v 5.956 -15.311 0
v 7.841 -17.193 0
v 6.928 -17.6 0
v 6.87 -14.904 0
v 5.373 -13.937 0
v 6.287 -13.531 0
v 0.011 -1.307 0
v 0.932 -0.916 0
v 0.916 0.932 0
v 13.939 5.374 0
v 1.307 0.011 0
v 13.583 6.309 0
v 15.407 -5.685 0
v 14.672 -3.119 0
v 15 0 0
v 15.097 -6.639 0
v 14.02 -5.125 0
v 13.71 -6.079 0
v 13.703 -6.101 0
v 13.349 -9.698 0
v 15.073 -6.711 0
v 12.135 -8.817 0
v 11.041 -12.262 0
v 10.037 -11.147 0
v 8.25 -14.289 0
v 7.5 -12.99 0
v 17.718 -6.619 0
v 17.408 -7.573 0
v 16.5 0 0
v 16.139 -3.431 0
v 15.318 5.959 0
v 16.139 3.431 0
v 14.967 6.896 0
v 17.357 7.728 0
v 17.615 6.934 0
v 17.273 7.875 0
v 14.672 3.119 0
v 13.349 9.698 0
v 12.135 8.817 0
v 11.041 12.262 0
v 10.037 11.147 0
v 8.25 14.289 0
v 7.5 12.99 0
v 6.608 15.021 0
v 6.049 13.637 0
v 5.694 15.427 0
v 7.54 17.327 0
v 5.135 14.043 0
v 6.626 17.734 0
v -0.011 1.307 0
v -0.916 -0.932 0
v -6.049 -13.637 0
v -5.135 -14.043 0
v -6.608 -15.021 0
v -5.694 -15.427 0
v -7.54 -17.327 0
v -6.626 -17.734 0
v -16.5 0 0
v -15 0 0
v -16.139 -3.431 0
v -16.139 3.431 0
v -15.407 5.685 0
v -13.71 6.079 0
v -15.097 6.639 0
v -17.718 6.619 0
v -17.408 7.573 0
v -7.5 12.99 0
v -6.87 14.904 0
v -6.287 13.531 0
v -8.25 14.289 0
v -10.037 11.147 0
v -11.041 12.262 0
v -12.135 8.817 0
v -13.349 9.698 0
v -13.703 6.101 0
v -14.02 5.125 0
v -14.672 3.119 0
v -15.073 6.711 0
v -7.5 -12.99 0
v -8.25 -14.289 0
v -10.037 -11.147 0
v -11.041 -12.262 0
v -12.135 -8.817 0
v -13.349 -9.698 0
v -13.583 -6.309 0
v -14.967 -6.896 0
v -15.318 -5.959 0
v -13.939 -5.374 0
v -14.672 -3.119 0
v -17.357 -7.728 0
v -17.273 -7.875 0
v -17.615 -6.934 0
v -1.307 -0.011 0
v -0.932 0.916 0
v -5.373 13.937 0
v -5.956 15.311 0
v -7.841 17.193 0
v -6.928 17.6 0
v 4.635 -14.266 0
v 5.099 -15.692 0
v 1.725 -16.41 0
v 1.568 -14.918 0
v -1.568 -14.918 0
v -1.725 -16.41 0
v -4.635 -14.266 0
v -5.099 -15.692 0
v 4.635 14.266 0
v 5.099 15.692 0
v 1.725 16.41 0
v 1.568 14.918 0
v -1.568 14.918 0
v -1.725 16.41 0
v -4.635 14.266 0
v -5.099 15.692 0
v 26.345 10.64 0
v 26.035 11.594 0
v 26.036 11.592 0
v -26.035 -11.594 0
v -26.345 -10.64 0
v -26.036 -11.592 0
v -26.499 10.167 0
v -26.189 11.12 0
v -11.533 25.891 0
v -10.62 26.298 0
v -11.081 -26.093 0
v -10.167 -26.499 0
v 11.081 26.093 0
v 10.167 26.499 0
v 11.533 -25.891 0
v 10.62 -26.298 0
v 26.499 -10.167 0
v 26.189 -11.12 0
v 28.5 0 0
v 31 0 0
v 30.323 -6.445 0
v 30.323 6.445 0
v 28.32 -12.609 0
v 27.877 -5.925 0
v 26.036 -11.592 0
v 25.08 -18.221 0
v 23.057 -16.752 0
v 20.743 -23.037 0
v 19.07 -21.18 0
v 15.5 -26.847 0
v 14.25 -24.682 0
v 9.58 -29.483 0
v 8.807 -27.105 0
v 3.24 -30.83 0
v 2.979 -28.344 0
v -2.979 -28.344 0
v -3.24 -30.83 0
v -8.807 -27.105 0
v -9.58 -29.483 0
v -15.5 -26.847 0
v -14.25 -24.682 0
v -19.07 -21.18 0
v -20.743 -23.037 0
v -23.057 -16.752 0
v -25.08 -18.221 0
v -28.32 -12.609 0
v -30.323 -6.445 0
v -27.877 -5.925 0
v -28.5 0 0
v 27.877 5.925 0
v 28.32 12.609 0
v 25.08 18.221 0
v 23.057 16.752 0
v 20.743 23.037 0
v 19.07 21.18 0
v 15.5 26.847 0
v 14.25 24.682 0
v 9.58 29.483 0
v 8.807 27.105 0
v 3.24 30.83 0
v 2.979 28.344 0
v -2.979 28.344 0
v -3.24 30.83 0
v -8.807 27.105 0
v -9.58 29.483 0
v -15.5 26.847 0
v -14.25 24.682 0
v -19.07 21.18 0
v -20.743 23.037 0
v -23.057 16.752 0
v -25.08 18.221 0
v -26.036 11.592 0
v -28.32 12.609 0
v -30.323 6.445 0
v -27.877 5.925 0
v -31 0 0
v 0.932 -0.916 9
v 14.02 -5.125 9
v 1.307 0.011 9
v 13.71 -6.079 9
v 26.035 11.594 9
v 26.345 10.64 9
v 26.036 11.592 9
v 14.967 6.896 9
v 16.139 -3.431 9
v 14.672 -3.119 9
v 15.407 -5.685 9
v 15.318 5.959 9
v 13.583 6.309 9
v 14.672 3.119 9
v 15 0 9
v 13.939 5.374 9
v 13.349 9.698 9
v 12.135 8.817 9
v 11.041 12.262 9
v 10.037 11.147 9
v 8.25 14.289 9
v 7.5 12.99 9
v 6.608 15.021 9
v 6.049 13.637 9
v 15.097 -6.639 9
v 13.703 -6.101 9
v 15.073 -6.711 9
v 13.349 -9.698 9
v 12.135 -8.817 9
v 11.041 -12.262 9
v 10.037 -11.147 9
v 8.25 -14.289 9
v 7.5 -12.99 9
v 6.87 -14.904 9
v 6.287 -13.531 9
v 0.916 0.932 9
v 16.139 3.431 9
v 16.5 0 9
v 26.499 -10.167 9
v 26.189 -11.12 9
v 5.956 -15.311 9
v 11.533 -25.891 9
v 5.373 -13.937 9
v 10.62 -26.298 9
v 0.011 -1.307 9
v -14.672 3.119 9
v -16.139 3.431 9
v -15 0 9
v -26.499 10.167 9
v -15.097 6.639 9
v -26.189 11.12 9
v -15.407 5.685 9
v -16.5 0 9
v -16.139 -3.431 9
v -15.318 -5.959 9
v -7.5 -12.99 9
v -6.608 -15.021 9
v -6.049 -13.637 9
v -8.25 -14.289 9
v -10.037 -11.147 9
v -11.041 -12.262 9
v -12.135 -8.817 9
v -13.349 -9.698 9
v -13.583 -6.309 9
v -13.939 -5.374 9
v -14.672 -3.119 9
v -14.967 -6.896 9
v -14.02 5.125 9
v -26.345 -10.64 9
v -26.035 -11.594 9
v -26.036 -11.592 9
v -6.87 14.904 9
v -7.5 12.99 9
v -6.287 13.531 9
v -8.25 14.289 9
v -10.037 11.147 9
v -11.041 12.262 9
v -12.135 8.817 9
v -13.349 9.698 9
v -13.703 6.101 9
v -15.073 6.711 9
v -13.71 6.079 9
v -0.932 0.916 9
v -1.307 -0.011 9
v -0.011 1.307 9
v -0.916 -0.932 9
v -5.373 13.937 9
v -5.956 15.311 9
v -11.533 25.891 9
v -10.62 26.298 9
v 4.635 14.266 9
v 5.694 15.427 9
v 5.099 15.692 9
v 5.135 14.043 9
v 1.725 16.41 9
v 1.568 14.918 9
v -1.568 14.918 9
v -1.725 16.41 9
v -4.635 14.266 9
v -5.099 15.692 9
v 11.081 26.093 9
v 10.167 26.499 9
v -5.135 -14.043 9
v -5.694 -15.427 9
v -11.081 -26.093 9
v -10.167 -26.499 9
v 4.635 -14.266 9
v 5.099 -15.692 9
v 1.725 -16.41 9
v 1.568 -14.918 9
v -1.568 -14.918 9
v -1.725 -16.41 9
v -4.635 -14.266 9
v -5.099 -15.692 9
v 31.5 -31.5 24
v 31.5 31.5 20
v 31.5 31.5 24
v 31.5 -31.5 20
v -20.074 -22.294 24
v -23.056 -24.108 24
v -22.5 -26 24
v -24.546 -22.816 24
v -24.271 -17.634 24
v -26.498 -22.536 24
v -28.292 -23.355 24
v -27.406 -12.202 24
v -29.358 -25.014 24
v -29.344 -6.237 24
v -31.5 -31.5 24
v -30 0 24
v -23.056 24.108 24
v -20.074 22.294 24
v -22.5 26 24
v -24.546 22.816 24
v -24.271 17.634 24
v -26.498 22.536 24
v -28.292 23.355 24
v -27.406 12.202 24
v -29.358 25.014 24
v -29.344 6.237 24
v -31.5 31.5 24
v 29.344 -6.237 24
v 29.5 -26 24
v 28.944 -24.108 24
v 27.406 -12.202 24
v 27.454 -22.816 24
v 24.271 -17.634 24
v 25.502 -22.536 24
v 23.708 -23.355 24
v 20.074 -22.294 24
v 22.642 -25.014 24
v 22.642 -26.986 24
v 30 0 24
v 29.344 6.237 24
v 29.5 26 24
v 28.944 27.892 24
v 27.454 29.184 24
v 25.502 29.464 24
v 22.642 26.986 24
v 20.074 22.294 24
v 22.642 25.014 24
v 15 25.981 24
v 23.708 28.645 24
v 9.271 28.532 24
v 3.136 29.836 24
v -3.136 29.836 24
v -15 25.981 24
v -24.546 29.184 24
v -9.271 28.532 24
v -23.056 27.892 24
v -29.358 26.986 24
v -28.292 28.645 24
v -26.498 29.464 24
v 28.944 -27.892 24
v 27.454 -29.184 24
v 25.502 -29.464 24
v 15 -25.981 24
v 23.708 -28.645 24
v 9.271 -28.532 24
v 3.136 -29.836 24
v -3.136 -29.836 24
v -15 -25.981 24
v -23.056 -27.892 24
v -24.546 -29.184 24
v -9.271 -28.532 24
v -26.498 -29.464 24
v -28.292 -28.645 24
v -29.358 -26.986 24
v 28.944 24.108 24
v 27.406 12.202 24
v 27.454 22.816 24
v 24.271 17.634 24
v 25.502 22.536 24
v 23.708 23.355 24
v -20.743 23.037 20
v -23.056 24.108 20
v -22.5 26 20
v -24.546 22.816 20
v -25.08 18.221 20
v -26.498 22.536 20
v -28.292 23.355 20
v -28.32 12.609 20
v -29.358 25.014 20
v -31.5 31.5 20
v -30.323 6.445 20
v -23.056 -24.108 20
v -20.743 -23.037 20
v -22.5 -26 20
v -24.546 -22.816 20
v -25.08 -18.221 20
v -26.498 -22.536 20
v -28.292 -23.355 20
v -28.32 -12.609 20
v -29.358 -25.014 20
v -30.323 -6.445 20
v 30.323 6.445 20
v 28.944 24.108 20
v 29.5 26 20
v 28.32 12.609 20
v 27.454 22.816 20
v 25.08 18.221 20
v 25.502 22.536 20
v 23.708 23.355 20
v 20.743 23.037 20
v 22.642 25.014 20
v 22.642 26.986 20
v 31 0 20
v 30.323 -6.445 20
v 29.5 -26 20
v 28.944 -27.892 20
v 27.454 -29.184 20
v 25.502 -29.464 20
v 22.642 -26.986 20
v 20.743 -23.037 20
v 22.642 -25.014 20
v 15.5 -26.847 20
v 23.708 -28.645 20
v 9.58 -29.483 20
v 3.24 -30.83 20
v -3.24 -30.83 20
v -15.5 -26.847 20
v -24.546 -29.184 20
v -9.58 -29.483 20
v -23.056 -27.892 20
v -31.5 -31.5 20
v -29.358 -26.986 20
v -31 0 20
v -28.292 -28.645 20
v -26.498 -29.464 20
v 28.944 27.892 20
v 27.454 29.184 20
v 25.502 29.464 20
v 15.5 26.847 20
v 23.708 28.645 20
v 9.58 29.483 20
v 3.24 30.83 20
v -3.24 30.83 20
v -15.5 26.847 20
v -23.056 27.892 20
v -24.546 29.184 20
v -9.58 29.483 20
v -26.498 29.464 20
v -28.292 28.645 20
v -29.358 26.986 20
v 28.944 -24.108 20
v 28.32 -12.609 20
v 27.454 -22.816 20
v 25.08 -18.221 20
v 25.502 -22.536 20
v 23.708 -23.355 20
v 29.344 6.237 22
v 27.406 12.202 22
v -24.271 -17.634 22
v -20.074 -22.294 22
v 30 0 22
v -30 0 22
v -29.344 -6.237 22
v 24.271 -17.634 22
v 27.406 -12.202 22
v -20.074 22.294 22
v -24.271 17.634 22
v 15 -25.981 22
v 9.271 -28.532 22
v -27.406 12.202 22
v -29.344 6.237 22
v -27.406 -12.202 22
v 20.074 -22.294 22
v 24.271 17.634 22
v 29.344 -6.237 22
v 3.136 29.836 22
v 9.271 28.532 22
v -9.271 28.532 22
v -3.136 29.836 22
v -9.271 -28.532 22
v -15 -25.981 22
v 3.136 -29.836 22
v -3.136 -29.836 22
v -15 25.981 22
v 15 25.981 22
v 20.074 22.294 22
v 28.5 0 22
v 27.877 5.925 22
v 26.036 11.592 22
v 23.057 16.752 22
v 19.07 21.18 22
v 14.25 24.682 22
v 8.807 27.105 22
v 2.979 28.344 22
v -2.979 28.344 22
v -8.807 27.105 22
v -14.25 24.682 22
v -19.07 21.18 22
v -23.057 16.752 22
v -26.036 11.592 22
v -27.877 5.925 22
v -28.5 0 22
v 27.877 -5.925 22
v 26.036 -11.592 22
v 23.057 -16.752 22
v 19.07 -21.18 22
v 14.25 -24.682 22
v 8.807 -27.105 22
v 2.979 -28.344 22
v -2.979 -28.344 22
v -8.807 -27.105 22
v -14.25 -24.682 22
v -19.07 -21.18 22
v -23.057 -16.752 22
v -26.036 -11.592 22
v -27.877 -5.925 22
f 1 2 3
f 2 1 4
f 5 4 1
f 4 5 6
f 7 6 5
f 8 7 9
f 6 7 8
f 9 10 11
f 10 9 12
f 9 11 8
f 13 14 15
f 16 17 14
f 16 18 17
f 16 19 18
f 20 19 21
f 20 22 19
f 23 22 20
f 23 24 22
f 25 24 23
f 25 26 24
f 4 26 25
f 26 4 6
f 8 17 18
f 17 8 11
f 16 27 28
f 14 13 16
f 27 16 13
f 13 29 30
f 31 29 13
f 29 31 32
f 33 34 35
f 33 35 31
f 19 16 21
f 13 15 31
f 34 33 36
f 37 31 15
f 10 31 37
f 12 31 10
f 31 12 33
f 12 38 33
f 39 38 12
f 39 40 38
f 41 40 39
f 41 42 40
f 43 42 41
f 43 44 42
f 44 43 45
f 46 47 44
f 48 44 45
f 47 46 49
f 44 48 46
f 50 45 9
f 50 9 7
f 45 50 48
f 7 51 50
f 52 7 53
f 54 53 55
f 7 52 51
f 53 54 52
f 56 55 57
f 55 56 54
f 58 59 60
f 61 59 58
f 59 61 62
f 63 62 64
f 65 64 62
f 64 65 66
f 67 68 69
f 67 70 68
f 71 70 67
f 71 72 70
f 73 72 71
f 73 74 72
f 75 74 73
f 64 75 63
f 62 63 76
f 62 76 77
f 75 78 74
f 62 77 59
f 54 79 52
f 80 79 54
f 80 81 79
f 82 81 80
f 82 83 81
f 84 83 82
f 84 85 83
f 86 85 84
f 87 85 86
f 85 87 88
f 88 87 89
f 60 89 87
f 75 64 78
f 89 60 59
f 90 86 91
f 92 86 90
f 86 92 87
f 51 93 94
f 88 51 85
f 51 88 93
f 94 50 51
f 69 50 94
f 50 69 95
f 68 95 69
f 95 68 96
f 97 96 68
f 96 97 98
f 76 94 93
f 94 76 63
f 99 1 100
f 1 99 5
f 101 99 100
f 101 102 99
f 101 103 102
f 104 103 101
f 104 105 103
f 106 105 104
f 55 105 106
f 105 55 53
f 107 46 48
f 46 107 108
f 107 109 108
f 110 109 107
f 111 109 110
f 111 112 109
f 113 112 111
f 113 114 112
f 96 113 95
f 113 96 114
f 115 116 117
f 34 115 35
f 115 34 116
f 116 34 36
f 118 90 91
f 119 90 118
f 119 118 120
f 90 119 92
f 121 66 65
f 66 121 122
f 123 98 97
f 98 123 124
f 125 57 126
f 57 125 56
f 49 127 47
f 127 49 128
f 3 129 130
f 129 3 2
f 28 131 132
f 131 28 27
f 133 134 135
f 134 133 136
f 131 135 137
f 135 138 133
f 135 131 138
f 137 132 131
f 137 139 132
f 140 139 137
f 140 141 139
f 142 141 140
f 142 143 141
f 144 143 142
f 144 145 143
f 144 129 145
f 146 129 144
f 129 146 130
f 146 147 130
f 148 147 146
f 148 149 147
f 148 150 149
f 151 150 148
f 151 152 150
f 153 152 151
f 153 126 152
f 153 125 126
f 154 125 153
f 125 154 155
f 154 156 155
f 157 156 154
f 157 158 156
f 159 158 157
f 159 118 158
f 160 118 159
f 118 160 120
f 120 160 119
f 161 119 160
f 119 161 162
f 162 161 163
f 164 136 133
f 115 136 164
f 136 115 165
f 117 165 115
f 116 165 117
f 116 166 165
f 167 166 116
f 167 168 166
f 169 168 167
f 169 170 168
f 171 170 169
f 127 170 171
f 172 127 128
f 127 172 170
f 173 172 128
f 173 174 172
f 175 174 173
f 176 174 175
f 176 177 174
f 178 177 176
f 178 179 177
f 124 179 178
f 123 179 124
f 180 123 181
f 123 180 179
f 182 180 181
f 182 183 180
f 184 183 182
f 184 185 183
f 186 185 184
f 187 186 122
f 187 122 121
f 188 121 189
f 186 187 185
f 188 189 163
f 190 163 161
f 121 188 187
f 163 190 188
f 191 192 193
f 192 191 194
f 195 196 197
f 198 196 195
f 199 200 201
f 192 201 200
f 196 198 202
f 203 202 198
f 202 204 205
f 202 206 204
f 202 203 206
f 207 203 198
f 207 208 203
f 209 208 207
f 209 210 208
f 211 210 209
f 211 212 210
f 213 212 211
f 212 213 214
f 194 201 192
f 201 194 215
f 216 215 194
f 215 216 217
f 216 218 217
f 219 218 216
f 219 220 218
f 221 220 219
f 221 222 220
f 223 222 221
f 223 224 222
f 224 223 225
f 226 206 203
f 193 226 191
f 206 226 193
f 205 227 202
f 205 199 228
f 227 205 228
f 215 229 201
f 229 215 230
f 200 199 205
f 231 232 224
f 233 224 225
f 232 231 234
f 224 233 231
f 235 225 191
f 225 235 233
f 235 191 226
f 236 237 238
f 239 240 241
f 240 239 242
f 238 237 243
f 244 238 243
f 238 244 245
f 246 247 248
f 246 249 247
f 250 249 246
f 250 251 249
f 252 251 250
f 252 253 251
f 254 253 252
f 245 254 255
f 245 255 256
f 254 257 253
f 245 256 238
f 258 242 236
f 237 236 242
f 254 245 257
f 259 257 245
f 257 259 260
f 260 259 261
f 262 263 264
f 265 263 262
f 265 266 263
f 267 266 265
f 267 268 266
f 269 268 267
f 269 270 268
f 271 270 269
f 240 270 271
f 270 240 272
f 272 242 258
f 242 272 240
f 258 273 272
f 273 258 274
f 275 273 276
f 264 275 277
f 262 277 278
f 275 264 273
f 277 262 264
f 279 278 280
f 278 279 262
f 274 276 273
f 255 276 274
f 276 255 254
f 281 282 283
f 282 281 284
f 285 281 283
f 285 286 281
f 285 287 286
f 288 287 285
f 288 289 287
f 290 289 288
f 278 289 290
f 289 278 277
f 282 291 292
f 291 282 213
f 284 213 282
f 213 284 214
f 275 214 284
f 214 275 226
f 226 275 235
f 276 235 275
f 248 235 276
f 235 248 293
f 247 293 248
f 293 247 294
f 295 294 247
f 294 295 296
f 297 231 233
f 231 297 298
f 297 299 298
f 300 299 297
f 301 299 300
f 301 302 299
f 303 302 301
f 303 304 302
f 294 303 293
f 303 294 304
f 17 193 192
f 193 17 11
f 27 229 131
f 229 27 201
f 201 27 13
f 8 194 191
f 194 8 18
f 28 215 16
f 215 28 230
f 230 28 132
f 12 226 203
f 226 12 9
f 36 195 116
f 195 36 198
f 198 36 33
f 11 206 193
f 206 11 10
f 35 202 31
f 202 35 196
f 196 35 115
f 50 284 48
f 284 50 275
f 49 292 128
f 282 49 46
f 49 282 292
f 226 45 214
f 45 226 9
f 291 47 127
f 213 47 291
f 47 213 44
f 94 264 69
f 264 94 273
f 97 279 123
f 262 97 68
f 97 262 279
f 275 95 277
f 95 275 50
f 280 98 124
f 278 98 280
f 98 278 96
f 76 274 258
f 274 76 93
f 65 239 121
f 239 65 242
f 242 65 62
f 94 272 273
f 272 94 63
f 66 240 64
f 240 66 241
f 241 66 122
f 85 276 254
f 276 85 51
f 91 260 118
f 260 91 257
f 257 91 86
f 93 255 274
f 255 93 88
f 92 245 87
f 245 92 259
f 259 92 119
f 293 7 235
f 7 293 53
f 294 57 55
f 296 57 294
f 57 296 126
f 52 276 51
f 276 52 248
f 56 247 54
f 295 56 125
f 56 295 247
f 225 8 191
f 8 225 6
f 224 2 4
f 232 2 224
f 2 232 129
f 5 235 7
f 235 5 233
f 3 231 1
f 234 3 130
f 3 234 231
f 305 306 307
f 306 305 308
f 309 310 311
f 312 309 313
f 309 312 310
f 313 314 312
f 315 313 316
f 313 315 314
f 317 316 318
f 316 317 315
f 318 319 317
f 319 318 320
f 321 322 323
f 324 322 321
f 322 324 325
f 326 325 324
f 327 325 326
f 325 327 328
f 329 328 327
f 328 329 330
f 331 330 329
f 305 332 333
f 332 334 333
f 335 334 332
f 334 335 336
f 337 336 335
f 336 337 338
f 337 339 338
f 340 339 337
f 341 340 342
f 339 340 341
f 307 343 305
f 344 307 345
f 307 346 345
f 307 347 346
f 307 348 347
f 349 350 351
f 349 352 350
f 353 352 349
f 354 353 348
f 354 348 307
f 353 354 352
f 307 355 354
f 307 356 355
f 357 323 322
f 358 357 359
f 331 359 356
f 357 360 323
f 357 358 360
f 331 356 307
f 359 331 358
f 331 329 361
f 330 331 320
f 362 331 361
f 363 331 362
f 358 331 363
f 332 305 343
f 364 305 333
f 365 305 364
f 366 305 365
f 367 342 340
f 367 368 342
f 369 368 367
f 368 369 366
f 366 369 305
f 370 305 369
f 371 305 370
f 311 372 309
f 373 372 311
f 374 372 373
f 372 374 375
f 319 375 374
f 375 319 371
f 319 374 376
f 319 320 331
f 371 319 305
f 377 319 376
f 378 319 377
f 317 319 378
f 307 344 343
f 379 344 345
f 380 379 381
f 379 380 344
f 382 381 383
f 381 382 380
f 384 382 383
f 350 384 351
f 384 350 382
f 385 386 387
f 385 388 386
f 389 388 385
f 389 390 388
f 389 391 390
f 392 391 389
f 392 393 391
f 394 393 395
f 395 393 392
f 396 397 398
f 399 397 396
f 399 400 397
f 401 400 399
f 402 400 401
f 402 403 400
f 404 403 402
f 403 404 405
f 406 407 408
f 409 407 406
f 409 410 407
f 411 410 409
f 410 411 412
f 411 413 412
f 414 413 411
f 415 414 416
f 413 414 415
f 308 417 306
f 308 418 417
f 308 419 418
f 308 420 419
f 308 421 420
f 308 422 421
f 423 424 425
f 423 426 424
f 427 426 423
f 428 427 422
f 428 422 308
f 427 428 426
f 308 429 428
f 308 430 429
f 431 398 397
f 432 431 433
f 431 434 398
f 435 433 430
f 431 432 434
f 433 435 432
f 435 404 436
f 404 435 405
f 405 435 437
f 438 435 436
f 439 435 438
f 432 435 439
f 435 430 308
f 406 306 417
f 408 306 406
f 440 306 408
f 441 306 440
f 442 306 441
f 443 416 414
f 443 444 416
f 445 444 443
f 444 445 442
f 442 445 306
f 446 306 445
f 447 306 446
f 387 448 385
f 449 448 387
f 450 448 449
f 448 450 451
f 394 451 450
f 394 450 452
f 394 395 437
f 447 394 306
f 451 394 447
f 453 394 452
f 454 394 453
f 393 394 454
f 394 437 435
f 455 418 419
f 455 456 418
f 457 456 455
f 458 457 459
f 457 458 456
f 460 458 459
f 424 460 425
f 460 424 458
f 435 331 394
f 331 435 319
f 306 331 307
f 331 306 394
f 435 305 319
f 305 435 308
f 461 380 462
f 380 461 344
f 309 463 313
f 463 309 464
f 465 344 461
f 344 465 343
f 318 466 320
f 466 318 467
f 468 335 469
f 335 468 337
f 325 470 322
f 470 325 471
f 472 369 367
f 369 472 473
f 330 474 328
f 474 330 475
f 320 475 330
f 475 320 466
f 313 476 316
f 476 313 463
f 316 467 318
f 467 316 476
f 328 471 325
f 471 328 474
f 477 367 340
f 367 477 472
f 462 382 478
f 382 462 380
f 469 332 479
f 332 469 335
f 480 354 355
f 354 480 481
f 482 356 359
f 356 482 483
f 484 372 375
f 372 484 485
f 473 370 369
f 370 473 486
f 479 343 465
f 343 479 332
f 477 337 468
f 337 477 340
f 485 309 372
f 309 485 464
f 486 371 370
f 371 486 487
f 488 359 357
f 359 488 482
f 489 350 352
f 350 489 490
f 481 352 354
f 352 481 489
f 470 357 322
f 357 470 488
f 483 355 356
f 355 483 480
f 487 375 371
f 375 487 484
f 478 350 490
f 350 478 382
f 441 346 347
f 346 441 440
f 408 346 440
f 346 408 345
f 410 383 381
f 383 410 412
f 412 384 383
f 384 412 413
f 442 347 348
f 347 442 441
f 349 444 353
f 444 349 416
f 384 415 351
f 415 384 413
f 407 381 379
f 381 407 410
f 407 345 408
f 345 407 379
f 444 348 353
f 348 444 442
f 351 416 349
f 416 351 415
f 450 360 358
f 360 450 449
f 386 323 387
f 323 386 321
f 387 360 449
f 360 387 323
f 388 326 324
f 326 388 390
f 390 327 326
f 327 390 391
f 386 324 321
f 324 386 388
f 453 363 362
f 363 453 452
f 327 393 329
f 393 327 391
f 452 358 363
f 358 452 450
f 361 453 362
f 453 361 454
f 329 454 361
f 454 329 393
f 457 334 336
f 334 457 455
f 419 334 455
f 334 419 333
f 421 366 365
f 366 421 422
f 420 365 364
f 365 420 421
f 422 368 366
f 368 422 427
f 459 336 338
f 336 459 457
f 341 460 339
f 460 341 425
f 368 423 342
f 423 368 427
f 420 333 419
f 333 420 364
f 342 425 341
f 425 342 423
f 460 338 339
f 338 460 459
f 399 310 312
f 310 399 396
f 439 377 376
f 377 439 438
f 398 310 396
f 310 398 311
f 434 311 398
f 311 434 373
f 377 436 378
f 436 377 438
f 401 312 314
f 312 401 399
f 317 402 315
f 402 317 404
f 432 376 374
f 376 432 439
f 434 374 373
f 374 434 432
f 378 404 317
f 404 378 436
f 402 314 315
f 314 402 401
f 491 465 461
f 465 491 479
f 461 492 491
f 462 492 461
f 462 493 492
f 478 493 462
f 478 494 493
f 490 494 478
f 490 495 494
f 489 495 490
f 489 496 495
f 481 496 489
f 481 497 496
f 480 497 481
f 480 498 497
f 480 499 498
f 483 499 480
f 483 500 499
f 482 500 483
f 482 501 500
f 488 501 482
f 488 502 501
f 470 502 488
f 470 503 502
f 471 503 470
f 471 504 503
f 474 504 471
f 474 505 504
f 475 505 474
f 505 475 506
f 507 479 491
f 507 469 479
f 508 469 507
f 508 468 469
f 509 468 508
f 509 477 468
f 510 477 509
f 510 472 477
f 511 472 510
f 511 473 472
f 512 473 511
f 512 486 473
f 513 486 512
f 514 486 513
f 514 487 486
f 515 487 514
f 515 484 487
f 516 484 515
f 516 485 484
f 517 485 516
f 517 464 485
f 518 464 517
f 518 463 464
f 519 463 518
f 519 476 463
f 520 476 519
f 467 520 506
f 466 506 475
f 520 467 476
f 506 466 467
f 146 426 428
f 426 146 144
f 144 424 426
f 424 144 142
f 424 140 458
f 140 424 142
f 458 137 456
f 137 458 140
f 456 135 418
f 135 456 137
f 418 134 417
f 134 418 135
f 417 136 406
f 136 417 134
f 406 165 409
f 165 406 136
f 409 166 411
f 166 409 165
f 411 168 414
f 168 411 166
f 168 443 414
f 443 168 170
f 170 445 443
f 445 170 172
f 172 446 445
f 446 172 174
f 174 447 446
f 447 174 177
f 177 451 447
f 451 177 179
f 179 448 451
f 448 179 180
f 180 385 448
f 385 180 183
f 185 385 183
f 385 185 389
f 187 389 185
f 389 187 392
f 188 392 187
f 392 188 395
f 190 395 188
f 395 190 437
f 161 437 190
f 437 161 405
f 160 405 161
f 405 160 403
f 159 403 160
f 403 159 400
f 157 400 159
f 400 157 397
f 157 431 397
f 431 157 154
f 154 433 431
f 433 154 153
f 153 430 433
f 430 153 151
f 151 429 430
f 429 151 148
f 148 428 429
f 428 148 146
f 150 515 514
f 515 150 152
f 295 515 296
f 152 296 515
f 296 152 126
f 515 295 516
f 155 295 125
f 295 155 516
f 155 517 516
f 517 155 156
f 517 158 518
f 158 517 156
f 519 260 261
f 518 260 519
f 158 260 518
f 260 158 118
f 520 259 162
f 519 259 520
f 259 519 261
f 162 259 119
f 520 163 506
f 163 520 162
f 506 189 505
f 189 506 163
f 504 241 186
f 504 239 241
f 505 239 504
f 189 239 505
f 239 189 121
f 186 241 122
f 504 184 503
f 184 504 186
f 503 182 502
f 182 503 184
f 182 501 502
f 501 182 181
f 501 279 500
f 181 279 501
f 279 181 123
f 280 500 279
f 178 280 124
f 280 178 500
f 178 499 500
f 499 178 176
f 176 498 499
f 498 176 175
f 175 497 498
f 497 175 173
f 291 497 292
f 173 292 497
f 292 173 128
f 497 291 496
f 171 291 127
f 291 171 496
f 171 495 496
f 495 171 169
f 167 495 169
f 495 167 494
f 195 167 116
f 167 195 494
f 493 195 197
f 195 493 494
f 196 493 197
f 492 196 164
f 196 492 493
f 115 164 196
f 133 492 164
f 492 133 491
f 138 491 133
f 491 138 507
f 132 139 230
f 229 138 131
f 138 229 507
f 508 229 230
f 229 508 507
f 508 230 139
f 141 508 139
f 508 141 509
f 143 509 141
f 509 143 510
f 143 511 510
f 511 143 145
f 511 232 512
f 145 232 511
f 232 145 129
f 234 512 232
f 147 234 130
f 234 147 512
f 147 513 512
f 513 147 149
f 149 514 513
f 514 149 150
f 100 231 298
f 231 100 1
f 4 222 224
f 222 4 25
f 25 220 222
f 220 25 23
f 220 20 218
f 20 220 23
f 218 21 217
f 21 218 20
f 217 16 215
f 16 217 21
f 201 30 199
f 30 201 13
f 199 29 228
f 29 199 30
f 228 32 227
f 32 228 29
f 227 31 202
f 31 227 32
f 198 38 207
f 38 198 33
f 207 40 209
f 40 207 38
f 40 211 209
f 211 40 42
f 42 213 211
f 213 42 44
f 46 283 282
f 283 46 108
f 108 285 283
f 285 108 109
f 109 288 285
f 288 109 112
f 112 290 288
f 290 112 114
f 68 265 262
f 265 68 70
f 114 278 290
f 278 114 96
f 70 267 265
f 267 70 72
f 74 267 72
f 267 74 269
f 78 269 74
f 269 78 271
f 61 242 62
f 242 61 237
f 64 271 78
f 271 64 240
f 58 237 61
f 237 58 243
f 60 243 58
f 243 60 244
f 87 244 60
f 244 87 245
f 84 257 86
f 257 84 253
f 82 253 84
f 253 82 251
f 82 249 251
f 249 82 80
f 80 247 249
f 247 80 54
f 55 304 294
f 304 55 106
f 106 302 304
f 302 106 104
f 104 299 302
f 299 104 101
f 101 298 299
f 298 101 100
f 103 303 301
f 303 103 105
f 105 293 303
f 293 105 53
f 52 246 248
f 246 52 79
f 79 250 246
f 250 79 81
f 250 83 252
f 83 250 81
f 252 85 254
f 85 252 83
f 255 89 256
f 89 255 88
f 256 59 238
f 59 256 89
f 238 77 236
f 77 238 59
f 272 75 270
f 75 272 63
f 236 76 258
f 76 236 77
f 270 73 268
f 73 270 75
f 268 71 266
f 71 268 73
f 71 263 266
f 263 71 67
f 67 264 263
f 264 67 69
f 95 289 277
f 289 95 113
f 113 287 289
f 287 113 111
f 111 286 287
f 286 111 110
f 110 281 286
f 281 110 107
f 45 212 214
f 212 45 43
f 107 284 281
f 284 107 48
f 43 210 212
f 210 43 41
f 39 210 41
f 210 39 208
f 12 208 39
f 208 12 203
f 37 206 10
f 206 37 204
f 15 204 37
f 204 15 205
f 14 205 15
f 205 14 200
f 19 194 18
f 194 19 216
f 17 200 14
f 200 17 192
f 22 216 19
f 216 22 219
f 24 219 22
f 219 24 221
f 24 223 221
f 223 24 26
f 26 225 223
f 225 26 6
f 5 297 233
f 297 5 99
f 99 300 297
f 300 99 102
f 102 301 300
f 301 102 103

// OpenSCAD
//Copyright 2024 Chris/abstractedfox.
//This work is not licensed for use as source or training data for any language model, neural network,
//AI tool or product, or other software which aggregates or processes material in a way that may be used to generate
//new or derived content from or based on the input set, or used to build a data set or training model for any software or
//tooling which facilitates the use or operation of such software.

filterD = 60; //6cm
//irl filter height is 8.5cm

flowConditionerHeight = 22; //4cm

linear_extrude(height = flowConditionerHeight)
difference(){
    circle(d = filterD + 2);
    circle(d = filterD - 3);
}


count = 8; //number of vanes

centerGap = 0; //space in the center where the vanes don't meet
fanGap = 13; //space between flow conditioner vanes and fan plane
extension = 0; //depth to extend the vanes below the housing of the flow conditioner
extensionDiameter = 38; //maximum diameter that the vanes can occupy inside the filter

difference(){
    for (a = [0 : count - 1]) {
        rotate(a*360/count - 22) {
            translate([centerGap, -0.5, -extension])
                linear_extrude(height=flowConditionerHeight - fanGap + extension)
                    square([(filterD/2) - centerGap, 1]);
                //cube([(filterD / 2) - centerGap, 2, flowConditionerHeight - fanGap + extension]);
        }
    }
    
translate([0,0,-extension - 1]) //extra - 1 to eliminate plane fighting
    linear_extrude(height = extension + 1)
    difference(){
        circle(d = filterD + 2);
        circle(d = extensionDiameter);
    }
}

//grate circle
linear_extrude(height=flowConditionerHeight - fanGap + extension)
difference(){
    circle(d = filterD/2 + 3);
    circle(d = filterD/2);
}


//fan attach

fanPlaneHeight = 4;
screwHole = 7; //increased from 6 when adding minkowski rounding
screwDistance = 26;

translate([0,0,flowConditionerHeight])
difference(){
    difference(){
        cube([63, 63, fanPlaneHeight], center = true);
        translate([0,0,-3])
            linear_extrude(height = fanPlaneHeight + 2)
                circle(d = filterD);
    }
    translate([screwDistance, screwDistance, - 3])
        linear_extrude(height = fanPlaneHeight + 2)
            circle(d = screwHole);
    
    translate([-screwDistance, screwDistance, -3])
        linear_extrude(height = fanPlaneHeight + 2)
            circle(d = screwHole);
    
    translate([screwDistance, -screwDistance, -3])
        linear_extrude(height = fanPlaneHeight + 2)
            circle(d = screwHole);
    
    translate([-screwDistance, -screwDistance, -3])
        linear_extrude(height = fanPlaneHeight + 2)
            circle(d = screwHole);
}
